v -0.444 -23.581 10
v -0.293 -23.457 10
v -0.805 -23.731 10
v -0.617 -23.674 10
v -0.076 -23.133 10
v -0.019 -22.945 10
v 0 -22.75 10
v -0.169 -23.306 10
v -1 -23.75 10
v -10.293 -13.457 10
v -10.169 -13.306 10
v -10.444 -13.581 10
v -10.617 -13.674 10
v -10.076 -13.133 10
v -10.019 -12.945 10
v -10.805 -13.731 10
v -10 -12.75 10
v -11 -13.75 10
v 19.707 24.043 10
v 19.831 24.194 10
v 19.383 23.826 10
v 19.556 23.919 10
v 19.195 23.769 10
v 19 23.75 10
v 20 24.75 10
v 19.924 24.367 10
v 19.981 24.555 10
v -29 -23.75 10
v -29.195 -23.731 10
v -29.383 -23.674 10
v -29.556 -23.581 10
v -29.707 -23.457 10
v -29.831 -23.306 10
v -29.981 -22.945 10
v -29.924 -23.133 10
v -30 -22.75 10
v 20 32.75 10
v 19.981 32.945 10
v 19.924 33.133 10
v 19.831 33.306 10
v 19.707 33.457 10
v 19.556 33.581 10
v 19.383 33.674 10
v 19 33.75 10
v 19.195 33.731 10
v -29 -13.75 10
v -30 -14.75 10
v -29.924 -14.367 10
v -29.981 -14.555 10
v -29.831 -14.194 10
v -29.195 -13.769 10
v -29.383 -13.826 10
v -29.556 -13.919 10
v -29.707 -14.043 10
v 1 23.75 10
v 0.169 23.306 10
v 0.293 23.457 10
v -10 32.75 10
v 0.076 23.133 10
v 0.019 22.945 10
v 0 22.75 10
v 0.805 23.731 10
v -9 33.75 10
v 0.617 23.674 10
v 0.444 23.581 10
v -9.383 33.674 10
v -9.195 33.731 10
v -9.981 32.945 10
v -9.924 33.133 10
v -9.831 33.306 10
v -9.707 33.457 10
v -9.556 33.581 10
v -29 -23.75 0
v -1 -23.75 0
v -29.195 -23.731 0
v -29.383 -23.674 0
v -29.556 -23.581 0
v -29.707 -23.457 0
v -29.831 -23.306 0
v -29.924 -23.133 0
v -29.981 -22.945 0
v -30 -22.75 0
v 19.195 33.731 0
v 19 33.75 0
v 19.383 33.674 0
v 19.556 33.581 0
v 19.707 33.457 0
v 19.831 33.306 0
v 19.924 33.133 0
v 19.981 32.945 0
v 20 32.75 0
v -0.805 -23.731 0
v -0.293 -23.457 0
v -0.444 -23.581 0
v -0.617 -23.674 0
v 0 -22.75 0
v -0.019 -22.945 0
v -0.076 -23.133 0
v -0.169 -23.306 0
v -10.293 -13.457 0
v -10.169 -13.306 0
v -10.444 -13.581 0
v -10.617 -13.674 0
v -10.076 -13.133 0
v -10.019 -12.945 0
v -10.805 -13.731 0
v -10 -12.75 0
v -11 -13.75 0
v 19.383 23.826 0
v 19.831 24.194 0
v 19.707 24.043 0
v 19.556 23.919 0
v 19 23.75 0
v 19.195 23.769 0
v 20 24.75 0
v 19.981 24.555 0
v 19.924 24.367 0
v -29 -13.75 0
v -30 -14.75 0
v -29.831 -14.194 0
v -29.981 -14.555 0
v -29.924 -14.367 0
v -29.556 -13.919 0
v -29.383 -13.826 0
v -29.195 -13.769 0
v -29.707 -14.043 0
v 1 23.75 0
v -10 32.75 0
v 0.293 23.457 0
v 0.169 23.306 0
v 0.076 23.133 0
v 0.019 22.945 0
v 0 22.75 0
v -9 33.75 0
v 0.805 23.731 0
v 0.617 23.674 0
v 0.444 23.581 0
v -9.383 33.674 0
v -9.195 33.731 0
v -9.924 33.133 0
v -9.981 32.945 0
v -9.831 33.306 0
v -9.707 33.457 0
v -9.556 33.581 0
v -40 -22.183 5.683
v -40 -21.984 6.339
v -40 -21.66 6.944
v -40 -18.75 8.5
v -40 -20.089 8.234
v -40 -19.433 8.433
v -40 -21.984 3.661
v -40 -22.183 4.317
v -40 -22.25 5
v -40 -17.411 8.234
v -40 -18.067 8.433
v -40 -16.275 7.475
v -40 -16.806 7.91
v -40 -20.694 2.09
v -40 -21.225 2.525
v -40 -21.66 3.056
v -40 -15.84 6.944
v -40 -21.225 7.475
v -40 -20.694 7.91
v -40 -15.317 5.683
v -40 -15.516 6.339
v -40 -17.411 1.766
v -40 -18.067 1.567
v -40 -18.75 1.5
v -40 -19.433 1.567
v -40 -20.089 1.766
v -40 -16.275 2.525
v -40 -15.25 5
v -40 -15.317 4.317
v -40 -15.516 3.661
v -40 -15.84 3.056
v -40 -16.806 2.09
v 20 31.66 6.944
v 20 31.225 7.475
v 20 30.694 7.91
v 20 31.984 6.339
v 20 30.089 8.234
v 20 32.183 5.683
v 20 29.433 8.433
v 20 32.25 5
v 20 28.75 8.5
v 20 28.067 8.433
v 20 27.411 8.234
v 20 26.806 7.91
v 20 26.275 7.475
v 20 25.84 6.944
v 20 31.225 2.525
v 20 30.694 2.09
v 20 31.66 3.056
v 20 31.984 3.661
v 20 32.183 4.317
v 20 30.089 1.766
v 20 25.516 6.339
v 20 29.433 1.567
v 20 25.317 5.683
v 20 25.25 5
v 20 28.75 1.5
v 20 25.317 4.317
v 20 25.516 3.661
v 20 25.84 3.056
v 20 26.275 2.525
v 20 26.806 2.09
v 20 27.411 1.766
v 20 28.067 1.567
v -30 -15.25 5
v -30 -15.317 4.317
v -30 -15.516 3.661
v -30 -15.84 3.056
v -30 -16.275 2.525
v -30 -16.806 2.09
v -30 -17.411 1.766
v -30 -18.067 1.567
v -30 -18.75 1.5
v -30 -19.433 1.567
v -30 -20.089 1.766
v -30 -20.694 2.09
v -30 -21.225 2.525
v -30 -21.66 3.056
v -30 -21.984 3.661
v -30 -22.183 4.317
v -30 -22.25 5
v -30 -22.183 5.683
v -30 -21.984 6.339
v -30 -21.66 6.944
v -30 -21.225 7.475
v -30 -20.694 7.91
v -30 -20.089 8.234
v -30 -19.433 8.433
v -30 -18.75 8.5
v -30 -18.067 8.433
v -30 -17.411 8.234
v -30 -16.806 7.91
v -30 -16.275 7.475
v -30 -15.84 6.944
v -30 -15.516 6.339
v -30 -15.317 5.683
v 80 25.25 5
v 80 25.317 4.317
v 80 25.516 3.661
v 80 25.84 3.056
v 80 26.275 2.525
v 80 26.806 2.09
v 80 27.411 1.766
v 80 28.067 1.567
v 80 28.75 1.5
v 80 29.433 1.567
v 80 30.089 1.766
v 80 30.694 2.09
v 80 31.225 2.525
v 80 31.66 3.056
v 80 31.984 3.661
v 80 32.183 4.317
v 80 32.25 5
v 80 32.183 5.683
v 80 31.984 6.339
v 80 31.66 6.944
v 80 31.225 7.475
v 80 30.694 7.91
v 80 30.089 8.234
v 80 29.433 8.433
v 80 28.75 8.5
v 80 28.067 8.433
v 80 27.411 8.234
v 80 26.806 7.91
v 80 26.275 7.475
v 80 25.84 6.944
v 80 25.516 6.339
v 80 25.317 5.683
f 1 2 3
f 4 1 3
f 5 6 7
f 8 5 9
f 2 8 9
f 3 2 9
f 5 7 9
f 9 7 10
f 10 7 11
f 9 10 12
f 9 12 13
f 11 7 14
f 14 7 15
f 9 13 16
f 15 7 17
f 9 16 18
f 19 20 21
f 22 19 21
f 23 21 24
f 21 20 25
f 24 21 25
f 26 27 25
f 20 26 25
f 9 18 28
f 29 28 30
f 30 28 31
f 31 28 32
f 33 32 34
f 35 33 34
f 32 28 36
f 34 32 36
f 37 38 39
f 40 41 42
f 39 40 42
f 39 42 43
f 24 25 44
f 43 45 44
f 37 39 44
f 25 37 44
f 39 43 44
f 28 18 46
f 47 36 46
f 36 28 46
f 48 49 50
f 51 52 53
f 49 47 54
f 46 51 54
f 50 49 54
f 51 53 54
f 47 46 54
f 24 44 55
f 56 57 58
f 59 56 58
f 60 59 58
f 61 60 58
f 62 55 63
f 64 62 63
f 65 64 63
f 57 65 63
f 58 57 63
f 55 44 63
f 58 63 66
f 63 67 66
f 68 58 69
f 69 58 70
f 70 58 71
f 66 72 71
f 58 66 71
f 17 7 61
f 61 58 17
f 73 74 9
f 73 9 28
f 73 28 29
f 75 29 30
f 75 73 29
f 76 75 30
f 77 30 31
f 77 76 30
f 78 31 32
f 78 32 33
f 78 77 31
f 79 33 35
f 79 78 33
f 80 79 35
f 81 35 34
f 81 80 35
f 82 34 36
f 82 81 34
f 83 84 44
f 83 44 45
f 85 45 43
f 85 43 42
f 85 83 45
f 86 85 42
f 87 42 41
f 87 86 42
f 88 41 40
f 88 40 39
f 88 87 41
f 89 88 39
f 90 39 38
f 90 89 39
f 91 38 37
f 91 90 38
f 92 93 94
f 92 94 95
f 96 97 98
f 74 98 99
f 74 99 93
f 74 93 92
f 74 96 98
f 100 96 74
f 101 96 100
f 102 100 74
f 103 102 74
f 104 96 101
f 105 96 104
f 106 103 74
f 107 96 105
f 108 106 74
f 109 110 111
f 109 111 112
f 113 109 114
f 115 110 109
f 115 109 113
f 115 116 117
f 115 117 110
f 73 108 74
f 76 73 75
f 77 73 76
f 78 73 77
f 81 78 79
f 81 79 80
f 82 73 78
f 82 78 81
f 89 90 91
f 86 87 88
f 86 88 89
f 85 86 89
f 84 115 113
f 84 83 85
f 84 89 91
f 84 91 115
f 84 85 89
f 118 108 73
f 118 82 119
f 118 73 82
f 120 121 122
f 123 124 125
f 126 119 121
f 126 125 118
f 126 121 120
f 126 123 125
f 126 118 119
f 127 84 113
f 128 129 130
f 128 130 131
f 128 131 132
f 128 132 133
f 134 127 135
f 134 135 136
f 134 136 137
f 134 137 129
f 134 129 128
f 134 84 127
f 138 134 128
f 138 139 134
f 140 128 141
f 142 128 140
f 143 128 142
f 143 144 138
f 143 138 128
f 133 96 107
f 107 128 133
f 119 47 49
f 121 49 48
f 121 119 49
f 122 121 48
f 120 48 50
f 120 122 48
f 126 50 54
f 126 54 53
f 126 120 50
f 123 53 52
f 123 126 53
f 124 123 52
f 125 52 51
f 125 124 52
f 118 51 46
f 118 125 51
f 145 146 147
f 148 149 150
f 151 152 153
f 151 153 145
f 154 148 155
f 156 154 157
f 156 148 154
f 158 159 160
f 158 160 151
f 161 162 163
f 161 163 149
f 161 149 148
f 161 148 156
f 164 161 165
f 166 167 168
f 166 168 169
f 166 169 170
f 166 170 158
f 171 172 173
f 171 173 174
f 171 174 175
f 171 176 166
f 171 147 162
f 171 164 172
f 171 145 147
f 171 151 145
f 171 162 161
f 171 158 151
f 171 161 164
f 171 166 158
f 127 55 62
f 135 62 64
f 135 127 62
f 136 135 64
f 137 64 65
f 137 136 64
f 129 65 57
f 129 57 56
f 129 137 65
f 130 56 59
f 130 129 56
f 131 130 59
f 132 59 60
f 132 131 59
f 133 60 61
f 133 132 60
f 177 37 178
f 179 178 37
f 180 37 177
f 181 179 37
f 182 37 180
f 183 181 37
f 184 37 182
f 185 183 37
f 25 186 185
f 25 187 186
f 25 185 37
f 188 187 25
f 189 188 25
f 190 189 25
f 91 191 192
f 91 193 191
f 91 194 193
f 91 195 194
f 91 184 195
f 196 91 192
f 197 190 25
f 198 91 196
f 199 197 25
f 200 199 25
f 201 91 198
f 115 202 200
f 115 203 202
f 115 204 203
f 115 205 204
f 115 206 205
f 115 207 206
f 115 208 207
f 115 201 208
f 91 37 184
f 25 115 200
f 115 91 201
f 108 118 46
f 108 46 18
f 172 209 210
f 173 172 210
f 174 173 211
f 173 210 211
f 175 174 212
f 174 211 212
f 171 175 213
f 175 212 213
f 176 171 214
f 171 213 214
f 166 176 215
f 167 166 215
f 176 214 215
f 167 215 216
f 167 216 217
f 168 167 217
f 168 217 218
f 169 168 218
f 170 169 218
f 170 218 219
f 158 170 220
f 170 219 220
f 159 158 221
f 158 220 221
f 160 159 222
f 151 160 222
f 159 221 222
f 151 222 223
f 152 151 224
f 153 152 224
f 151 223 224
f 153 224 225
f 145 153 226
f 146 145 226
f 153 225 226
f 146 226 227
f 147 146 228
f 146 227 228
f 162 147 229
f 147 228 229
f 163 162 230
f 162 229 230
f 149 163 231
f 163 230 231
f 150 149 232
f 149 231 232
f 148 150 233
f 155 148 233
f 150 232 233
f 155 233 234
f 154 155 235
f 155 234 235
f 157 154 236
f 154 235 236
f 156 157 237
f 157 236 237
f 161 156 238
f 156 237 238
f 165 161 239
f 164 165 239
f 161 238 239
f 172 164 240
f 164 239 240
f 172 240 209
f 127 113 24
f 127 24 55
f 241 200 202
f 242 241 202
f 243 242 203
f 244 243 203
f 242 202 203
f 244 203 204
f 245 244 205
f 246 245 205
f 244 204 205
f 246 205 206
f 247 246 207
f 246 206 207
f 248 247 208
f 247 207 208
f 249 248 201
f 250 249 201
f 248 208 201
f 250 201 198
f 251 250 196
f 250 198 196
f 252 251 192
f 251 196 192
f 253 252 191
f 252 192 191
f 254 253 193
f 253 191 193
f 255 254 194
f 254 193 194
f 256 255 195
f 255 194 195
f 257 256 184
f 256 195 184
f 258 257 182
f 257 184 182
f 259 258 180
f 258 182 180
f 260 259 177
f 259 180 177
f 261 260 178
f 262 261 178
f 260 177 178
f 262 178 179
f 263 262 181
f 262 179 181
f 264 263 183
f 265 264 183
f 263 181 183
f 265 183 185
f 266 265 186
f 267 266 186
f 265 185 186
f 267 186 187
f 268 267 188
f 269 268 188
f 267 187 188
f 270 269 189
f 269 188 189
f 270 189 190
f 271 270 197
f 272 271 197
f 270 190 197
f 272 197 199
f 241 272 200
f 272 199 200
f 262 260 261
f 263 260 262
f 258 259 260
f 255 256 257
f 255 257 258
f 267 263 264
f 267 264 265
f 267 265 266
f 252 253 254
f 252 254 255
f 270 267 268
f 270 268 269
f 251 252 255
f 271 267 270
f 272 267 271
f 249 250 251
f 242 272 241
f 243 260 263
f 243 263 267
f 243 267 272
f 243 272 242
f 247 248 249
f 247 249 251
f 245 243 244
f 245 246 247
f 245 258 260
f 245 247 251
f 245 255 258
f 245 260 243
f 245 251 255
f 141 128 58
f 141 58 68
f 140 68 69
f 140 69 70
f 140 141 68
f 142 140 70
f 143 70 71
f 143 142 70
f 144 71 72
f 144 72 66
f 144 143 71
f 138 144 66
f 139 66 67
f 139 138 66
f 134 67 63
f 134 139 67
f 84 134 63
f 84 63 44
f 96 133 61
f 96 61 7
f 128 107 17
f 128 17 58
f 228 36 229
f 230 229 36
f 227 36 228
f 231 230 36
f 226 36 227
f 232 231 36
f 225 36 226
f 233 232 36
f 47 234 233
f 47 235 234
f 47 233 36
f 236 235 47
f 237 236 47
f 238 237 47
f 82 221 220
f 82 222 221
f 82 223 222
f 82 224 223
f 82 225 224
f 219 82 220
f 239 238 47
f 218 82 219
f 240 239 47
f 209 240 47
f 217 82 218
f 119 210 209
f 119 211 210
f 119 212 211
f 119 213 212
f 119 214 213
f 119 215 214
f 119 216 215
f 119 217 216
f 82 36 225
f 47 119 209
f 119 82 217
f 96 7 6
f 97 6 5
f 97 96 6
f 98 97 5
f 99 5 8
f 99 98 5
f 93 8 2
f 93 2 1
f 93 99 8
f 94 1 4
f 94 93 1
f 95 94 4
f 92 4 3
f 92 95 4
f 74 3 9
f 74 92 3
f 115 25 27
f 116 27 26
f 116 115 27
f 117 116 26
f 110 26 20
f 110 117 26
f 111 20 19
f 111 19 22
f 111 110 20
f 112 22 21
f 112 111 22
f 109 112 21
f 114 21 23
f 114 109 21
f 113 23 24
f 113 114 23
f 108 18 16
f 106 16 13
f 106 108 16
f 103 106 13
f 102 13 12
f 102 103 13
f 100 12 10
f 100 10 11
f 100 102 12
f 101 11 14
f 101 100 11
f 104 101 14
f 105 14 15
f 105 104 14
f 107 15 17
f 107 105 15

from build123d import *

# Parameters (mm, degrees)
BOSS_EXTRUDE2_DEPTH = 10
SKETCH3_R           = 3.5
BOSS_EXTRUDE3_DEPTH = 60
SKETCH4_R           = 3.5
BOSS_EXTRUDE4_DEPTH = 10


with BuildPart() as part:
    # Sketch1 → Boss-Extrude2 (new body)
    with BuildSketch(Plane.XY):
        with BuildLine():
            Line((0, 22.75), (0, -22.75))
            ThreePointArc((0, -22.75), (-0.292893219, -23.457106781), (-1, -23.75))
            Line((-1, -23.75), (-29, -23.75))
            ThreePointArc((-29, -23.75), (-29.707106781, -23.457106781), (-30, -22.75))
            Line((-30, -22.75), (-30, -14.75))
            ThreePointArc((-30, -14.75), (-29.707106781, -14.042893219), (-29, -13.75))
            Line((-29, -13.75), (-11, -13.75))
            ThreePointArc((-11, -13.75), (-10.292893219, -13.457106781), (-10, -12.75))
            Line((-10, -12.75), (-10, 32.75))
            ThreePointArc((-10, 32.75), (-9.707106781, 33.457106781), (-9, 33.75))
            Line((-9, 33.75), (19, 33.75))
            ThreePointArc((19, 33.75), (19.707106781, 33.457106781), (20, 32.75))
            Line((20, 32.75), (20, 24.75))
            ThreePointArc((20, 24.75), (19.707106781, 24.042893219), (19, 23.75))
            Line((19, 23.75), (1, 23.75))
            ThreePointArc((1, 23.75), (0.292893219, 23.457106781), (0, 22.75))
        make_face()
    extrude(amount=BOSS_EXTRUDE2_DEPTH)

    # Sketch3 → Boss-Extrude3 (add)
    with BuildSketch(Plane(origin=(20, 0, 0), x_dir=(0, 0, -1), z_dir=(1, 0, 0))):
        with Locations(Location((-5, 28.75, 0), (0, 0, 270))):
            Circle(SKETCH3_R)
    extrude(amount=BOSS_EXTRUDE3_DEPTH)

    # Sketch4 → Boss-Extrude4 (add)
    with BuildSketch(Plane.ZY.offset(30)):
        with Locations(Location((5, -18.75, 0), (0, 0, 90))):
            Circle(SKETCH4_R)
    extrude(amount=BOSS_EXTRUDE4_DEPTH)


solid = part.part
